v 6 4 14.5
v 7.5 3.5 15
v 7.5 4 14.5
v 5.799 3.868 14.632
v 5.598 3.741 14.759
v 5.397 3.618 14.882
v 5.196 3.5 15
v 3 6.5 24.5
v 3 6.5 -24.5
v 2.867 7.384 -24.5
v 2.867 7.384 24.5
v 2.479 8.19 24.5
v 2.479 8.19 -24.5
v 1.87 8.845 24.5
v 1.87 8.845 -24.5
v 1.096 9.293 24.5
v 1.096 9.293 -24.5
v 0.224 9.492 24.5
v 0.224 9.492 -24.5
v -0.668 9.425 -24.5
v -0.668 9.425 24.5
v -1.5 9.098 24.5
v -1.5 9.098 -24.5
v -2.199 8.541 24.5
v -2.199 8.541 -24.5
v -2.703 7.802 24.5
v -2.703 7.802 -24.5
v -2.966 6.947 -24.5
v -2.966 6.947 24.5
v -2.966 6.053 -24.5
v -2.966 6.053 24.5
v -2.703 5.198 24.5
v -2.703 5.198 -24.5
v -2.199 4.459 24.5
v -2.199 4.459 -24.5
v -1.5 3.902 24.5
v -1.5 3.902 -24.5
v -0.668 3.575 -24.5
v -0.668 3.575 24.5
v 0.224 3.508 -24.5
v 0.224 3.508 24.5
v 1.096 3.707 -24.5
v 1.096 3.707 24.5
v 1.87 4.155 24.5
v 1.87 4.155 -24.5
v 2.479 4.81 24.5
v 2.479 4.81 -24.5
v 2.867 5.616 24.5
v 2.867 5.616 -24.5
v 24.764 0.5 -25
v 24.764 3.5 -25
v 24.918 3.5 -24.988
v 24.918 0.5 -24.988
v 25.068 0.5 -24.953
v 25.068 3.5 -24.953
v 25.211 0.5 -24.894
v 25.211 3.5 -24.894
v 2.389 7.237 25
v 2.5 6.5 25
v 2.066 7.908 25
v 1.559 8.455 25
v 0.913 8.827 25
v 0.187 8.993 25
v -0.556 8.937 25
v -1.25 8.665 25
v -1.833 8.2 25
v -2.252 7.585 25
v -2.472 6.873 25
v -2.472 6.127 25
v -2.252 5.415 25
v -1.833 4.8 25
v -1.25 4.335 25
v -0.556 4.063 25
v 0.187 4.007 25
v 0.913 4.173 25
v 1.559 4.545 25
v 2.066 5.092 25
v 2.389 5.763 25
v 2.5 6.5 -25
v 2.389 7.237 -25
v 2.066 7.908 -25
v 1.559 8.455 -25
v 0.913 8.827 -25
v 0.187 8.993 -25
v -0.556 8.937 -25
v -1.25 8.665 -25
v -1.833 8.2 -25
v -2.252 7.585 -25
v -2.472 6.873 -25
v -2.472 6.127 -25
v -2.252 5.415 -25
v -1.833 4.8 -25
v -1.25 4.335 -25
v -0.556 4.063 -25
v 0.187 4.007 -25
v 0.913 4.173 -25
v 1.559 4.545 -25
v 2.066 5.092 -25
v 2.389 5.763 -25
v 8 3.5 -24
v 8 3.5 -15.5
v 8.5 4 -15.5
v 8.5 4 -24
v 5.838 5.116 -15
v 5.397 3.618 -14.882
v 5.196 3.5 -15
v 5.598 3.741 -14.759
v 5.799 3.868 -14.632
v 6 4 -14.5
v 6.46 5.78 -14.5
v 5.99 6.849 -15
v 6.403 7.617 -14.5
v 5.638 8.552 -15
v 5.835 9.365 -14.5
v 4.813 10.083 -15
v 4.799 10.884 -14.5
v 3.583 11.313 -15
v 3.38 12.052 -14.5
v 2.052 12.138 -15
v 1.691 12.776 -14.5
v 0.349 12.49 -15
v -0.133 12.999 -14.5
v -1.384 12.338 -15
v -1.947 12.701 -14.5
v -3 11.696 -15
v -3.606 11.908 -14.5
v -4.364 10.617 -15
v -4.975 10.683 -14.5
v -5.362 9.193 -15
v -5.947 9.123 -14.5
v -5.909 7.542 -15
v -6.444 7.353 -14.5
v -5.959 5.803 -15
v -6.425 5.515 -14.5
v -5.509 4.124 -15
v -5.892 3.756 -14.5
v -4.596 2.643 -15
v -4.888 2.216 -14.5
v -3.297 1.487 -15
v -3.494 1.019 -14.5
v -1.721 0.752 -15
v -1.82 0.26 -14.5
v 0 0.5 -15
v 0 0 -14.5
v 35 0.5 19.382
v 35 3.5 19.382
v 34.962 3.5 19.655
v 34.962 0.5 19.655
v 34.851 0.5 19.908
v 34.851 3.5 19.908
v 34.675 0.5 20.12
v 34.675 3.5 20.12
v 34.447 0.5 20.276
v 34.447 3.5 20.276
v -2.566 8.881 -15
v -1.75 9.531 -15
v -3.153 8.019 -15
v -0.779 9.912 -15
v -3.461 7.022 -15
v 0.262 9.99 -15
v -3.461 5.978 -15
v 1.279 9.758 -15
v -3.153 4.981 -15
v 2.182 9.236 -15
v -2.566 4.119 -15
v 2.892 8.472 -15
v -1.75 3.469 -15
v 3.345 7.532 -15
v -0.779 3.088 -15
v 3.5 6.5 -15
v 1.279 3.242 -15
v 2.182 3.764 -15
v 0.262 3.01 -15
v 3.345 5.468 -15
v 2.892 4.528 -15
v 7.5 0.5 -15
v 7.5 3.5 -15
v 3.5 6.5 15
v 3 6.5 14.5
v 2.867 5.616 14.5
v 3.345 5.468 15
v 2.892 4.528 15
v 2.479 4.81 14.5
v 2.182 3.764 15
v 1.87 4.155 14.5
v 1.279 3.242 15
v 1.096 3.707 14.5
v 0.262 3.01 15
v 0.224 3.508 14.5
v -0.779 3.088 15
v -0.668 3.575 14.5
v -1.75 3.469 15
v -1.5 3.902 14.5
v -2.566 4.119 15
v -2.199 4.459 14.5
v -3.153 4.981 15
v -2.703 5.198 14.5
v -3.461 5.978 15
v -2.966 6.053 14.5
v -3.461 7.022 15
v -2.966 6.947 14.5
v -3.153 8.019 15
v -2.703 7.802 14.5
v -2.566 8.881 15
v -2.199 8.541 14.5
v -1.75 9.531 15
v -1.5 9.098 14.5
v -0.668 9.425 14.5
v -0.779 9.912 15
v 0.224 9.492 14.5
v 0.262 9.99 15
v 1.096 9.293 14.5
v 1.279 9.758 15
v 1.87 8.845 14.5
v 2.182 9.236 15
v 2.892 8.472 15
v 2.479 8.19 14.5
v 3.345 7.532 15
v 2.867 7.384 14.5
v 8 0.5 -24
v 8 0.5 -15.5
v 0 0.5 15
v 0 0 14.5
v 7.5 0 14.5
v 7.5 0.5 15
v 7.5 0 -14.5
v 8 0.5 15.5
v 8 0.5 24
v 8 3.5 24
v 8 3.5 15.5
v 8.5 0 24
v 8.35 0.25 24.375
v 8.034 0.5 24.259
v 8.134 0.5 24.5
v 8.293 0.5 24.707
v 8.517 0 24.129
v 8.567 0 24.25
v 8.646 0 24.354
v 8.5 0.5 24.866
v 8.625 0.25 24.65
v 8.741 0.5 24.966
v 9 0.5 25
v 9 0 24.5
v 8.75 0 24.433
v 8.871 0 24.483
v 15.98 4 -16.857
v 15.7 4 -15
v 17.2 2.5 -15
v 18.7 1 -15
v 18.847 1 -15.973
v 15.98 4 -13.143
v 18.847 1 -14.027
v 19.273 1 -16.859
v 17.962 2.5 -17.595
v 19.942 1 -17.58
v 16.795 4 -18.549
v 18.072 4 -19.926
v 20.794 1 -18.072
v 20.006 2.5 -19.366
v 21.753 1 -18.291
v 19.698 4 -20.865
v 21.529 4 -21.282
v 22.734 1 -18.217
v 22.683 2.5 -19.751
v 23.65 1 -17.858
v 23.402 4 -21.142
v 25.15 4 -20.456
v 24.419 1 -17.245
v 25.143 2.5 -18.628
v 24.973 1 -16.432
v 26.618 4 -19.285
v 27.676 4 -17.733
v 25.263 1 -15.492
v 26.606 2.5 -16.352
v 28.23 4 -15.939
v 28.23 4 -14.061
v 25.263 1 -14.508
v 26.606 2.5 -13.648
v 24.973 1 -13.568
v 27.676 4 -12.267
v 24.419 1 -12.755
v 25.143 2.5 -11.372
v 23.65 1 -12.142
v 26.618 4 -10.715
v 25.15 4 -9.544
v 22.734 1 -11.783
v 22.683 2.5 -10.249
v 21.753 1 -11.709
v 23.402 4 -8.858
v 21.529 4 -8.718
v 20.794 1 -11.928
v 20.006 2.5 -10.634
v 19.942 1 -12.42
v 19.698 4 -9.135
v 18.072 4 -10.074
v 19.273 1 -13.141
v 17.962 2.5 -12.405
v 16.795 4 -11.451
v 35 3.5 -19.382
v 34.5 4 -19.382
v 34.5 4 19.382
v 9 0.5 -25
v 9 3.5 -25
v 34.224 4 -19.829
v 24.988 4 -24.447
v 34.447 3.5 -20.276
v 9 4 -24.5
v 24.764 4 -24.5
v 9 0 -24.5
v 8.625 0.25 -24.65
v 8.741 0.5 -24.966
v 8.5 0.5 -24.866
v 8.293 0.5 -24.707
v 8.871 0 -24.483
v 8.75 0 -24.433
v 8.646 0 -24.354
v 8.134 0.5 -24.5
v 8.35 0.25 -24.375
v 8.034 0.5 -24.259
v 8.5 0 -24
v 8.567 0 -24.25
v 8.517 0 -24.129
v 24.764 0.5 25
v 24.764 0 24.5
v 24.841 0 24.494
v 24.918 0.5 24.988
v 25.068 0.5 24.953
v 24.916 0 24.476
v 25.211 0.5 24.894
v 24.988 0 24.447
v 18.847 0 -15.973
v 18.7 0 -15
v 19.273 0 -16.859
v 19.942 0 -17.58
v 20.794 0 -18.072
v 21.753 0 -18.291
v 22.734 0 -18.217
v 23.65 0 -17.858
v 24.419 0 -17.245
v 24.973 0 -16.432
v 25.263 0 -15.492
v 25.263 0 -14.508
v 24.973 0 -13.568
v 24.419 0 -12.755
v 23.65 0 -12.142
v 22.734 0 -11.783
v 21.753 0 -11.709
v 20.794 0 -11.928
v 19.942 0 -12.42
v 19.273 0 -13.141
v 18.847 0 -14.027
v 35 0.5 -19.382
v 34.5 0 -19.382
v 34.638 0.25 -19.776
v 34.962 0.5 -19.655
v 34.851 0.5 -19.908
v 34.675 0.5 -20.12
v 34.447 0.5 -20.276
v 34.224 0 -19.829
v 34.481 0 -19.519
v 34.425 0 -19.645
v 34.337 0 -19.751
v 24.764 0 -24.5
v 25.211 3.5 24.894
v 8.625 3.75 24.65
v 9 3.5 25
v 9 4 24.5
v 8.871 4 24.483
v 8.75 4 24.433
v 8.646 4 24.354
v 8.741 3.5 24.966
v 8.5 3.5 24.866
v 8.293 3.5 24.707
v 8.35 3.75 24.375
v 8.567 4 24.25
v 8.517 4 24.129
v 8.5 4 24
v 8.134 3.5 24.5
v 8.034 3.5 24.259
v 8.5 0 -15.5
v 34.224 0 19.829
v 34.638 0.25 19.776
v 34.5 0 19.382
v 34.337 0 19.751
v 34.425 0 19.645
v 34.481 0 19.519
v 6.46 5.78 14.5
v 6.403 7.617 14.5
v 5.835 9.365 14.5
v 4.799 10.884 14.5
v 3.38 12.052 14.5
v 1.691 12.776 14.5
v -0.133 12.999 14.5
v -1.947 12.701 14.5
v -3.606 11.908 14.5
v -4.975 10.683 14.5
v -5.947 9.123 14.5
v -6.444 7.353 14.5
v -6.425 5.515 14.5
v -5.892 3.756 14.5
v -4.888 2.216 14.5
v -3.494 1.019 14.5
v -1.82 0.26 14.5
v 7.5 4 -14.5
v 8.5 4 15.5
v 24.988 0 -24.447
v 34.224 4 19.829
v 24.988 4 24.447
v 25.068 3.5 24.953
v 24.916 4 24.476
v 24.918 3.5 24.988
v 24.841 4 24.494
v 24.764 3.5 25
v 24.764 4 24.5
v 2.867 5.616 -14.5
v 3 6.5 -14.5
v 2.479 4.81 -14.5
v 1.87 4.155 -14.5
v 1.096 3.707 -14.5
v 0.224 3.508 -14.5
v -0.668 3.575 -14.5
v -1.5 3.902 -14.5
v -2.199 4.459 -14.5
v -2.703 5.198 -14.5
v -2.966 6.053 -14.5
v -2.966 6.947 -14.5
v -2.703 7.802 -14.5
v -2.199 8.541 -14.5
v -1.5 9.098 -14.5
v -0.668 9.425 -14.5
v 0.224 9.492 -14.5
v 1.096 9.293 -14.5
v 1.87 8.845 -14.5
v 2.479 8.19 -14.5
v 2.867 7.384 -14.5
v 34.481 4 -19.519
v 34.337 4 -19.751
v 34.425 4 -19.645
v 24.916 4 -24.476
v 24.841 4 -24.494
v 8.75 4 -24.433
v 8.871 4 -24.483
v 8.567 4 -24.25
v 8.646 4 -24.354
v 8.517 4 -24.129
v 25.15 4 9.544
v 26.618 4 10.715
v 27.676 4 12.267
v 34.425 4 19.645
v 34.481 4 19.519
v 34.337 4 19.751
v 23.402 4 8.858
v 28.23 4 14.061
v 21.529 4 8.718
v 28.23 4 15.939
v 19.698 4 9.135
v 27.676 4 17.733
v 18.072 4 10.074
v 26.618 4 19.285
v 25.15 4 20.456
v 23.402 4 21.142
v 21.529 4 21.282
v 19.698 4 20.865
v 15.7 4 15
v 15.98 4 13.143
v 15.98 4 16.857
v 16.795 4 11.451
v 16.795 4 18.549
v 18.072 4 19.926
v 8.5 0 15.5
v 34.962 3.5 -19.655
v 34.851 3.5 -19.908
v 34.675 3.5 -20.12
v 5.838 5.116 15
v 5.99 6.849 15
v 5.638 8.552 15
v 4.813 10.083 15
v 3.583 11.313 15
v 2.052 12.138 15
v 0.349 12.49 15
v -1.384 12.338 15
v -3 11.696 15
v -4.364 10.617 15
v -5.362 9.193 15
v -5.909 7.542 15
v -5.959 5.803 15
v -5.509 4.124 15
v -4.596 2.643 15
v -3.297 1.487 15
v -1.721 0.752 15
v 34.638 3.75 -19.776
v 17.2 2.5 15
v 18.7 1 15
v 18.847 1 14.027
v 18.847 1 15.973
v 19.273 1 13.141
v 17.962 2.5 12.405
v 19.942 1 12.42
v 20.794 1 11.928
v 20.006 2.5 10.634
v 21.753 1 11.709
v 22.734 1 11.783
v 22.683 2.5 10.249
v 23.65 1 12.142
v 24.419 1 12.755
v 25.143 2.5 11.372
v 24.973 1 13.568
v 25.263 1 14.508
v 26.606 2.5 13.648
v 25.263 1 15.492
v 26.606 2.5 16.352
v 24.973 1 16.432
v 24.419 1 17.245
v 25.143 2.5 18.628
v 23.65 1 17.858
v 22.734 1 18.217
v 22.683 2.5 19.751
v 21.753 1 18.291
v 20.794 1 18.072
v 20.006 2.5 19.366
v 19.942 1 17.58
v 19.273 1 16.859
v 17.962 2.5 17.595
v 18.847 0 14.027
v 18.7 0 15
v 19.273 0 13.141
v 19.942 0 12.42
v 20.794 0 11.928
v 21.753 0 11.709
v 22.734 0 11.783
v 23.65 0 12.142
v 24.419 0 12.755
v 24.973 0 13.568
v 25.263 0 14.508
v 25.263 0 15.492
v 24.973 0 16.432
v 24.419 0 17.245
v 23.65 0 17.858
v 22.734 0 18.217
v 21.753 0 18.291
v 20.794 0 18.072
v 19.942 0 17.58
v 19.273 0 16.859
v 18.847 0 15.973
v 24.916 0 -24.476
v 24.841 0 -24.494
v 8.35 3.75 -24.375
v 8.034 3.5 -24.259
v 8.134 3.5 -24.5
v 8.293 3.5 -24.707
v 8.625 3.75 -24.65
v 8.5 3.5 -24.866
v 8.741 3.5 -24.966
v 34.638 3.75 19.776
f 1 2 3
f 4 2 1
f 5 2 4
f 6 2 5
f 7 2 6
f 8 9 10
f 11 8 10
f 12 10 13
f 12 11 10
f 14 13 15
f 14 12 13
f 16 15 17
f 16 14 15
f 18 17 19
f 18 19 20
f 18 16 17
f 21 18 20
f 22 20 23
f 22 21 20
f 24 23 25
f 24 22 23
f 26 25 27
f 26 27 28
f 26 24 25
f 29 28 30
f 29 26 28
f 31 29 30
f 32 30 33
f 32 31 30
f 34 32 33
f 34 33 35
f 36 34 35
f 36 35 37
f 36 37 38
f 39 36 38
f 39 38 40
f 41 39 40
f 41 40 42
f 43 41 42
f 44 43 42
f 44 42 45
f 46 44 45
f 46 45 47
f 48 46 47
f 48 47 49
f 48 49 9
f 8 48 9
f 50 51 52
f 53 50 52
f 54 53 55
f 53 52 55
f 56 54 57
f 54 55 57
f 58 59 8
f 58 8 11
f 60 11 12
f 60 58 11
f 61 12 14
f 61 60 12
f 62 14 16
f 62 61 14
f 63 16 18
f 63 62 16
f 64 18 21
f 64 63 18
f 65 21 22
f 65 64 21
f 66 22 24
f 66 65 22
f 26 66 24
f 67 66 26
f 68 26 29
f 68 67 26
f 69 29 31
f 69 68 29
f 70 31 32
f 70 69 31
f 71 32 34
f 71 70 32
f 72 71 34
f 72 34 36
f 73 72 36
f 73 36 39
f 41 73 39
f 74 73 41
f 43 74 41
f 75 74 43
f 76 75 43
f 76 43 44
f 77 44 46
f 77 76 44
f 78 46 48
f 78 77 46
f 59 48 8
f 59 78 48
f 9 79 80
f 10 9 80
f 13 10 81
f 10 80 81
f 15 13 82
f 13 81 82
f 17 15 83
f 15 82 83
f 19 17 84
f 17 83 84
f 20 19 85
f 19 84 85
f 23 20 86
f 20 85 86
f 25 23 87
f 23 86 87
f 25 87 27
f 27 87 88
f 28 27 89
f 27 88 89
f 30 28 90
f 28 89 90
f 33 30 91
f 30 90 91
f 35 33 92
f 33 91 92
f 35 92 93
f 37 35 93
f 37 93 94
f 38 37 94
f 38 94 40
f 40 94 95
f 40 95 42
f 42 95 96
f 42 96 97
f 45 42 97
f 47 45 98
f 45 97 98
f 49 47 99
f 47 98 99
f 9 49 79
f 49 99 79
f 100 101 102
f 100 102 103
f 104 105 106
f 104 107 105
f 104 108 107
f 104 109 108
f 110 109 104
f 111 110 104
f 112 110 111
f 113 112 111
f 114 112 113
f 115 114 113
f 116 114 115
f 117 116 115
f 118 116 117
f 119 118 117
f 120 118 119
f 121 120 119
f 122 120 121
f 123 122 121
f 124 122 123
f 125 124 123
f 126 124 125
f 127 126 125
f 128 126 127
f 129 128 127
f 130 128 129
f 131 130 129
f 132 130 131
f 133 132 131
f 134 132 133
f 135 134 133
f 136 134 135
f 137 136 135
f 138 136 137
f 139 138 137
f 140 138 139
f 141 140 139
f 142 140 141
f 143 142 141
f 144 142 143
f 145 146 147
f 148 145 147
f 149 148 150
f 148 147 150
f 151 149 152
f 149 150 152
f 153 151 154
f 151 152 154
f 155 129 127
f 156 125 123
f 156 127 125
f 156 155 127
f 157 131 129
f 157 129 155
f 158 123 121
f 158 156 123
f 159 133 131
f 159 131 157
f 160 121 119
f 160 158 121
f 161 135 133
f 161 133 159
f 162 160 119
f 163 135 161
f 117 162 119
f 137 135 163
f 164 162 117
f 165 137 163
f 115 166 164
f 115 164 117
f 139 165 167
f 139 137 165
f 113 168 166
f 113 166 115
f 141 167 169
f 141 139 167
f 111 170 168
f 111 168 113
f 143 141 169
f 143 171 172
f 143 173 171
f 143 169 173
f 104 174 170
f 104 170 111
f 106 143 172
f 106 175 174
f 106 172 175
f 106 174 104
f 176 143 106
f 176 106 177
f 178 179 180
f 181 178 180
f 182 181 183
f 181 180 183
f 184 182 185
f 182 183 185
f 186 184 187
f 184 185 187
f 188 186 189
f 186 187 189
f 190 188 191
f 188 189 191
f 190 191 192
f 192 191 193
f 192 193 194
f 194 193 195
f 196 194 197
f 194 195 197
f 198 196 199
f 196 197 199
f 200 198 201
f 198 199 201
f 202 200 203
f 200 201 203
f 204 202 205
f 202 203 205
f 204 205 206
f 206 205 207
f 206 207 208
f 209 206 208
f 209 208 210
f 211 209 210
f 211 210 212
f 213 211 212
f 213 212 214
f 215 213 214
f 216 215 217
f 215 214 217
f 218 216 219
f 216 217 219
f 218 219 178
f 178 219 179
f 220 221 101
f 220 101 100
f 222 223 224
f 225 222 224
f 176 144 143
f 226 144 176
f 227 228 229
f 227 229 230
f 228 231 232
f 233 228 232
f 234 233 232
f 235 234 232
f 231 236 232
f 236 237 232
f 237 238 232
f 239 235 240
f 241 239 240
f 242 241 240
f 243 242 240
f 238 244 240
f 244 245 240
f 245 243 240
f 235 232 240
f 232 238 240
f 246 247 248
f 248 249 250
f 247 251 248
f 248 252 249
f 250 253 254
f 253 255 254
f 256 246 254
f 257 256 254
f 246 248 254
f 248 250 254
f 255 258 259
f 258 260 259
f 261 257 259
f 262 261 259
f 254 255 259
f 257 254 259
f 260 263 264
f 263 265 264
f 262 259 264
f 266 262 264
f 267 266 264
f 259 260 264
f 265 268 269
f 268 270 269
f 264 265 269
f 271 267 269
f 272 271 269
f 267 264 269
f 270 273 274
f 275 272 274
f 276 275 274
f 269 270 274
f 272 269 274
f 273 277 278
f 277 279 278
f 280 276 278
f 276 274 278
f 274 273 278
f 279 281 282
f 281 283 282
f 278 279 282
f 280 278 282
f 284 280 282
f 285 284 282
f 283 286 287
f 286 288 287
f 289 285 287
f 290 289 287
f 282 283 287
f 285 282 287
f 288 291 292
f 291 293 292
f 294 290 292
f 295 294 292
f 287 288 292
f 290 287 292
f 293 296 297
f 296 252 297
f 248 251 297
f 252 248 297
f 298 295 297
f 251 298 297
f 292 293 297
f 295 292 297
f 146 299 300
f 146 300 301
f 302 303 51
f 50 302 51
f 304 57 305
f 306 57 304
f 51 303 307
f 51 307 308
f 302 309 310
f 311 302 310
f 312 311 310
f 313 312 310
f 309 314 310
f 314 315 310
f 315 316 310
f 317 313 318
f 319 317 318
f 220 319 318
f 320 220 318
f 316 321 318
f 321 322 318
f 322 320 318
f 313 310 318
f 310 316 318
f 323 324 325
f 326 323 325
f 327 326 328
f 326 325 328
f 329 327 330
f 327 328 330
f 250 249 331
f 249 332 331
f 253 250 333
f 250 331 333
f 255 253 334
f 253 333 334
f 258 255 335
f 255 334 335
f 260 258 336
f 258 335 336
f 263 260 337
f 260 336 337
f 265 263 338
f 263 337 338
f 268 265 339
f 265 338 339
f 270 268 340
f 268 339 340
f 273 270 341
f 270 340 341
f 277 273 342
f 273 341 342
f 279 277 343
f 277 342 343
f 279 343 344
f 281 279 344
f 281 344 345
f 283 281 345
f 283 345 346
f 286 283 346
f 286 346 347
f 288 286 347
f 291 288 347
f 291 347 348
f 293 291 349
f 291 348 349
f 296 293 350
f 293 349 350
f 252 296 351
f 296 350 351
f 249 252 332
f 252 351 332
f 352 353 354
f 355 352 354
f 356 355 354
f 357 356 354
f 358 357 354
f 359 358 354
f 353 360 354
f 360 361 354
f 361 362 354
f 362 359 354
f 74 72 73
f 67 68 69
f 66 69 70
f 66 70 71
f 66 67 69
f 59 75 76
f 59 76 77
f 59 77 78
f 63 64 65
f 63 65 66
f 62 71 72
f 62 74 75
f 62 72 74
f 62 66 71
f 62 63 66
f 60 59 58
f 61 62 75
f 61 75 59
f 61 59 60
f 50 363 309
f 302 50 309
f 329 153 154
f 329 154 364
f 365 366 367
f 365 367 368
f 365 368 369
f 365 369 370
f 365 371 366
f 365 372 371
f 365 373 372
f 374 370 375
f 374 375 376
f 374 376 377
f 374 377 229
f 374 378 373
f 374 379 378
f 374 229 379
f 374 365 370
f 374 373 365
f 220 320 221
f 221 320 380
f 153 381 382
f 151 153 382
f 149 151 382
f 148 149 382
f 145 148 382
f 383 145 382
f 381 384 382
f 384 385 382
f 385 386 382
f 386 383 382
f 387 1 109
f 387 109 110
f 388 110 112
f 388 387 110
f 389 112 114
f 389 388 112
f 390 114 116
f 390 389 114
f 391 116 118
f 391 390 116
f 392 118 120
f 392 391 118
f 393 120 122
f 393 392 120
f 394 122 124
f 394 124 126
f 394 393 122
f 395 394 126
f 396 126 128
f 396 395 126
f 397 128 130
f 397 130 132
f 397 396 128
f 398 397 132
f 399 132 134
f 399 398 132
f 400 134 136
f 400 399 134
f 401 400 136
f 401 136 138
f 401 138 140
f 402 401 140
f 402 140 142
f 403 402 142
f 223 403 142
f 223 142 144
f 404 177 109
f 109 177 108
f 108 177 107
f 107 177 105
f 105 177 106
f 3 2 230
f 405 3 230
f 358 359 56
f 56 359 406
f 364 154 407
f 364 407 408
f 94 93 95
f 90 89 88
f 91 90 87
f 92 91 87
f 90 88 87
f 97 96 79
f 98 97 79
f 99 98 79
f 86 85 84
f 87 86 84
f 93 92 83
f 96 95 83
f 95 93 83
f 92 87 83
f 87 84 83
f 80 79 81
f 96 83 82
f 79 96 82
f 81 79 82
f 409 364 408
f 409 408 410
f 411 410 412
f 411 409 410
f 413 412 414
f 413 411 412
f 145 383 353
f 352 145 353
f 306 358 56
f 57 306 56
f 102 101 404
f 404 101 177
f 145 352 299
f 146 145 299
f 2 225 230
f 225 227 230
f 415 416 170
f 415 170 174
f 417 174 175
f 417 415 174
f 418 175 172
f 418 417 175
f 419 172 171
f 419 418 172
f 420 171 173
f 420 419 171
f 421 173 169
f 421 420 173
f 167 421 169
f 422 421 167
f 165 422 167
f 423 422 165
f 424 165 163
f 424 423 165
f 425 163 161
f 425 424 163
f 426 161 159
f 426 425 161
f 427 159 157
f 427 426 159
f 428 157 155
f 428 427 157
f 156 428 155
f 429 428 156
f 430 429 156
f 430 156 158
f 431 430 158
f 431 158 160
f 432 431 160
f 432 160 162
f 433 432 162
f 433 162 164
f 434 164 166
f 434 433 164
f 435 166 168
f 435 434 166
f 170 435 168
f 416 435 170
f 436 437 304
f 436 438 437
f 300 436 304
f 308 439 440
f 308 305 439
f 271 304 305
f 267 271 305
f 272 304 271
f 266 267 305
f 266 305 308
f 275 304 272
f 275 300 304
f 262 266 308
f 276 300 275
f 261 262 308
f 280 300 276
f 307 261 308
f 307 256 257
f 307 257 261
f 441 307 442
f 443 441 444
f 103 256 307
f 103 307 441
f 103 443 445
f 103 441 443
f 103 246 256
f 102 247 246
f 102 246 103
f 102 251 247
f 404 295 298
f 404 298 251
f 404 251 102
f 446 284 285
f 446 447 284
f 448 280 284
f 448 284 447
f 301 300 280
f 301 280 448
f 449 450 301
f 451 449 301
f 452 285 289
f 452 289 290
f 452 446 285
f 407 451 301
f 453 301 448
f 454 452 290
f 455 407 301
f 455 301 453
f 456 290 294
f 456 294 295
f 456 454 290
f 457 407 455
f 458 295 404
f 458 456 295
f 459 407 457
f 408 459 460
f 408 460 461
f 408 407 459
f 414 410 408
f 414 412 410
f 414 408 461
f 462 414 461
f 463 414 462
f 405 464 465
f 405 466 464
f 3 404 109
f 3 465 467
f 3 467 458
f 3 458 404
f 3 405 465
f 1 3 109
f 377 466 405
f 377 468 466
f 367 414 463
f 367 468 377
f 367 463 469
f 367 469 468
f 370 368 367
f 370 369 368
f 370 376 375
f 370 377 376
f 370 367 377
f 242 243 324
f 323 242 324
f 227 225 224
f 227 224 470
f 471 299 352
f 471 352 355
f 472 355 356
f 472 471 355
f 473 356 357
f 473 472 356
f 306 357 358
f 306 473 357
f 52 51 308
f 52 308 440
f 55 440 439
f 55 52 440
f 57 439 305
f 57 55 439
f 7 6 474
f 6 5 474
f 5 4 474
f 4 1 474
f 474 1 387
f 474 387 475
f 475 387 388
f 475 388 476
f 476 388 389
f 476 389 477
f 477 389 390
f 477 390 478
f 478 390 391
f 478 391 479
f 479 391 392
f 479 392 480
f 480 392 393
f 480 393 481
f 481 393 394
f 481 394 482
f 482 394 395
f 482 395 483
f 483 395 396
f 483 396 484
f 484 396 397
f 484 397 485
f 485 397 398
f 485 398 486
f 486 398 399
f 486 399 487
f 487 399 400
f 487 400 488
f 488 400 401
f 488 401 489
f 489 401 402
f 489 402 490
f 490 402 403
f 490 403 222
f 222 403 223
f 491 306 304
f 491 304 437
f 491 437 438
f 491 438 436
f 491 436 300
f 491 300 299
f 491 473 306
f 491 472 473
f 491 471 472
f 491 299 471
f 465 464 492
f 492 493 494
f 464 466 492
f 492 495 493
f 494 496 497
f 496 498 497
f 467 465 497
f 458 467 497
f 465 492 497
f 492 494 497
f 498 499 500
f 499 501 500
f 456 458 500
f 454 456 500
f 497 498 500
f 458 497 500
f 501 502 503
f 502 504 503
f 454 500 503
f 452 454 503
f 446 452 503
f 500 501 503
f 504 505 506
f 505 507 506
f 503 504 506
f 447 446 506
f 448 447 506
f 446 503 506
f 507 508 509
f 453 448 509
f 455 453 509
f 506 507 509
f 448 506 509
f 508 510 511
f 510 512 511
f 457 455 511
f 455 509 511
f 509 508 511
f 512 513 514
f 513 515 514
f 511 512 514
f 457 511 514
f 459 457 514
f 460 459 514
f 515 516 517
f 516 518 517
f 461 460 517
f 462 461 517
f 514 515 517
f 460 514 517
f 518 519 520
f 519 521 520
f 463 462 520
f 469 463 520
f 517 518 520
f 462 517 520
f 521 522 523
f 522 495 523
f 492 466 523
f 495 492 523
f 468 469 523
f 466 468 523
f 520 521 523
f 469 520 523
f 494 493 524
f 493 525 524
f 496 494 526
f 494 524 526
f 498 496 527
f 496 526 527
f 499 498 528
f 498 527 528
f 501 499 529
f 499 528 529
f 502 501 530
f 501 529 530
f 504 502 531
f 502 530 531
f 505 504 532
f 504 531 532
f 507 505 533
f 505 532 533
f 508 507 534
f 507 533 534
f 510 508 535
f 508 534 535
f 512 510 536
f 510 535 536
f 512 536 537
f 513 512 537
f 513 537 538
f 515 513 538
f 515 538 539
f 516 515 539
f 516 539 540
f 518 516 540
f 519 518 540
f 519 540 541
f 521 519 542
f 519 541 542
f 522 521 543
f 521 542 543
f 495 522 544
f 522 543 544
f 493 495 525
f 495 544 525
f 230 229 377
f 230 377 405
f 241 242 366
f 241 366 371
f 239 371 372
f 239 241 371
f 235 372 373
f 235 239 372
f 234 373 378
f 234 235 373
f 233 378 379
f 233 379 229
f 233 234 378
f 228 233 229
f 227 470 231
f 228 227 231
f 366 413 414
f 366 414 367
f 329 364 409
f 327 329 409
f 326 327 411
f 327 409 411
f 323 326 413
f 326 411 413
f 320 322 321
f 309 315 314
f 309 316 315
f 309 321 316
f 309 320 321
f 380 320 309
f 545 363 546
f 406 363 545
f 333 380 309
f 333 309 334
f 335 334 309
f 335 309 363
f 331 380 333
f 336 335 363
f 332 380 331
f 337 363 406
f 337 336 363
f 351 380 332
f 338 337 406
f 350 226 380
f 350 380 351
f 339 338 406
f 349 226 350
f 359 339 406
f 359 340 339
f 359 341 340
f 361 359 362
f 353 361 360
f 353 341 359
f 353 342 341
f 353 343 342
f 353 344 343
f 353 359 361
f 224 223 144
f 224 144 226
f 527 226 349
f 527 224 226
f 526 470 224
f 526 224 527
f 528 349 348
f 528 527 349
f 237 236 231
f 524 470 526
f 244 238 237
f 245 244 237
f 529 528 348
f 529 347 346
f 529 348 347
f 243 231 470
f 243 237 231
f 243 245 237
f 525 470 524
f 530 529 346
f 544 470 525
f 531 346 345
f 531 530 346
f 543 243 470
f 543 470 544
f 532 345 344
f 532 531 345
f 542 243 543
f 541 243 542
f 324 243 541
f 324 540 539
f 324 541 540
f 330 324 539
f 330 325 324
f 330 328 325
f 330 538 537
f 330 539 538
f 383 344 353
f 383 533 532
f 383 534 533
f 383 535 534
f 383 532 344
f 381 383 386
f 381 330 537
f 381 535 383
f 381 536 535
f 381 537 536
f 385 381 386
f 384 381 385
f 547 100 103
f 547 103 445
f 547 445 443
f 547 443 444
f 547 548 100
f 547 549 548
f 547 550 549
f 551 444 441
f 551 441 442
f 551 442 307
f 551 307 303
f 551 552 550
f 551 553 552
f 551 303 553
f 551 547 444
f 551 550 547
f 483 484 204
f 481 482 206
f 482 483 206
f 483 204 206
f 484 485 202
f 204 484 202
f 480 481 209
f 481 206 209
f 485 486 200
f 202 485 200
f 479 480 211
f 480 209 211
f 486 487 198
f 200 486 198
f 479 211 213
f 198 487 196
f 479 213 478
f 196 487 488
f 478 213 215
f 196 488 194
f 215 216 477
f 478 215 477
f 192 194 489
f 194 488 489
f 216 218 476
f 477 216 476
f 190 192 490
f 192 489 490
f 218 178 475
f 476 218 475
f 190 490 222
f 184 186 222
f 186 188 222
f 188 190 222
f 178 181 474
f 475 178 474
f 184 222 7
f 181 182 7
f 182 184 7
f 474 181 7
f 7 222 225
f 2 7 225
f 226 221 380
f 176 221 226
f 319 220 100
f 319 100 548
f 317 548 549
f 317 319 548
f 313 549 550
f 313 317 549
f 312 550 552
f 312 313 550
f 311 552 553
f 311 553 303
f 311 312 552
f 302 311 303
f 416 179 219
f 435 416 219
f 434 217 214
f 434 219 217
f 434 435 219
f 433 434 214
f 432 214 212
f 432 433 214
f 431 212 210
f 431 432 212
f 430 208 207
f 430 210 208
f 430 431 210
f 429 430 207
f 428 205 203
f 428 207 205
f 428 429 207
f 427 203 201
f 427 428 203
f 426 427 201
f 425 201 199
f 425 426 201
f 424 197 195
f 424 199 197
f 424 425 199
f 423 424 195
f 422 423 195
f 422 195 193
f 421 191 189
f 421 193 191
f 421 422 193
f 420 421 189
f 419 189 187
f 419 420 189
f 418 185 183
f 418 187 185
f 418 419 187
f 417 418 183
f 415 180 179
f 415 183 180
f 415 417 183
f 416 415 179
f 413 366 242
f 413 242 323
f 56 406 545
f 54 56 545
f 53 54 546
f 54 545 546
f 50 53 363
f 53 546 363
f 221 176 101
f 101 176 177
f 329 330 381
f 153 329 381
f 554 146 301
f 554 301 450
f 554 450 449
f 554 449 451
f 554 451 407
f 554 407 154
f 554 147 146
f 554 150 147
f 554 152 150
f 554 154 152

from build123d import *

# Parameters (mm, degrees)
SKETCH2_R                                       = 3
BOSS_EXTRUDE1_DEPTH                             = 25
SKETCH3_W                                       = 30
SKETCH3_H                                       = 25
CUT_EXTRUDE1_DEPTH                              = 45.933283877
CSK_FOR_M6_FLAT_HEAD_MACHINE_SCREW1_D           = 6.6
CSK_FOR_M6_FLAT_HEAD_MACHINE_SCREW1_DEPTH       = 38.017159957
CSK_FOR_M6_FLAT_HEAD_MACHINE_SCREW1_CSINK_D     = 12.6
CSK_FOR_M6_FLAT_HEAD_MACHINE_SCREW1_CSINK_ANGLE = 90
CSK_FOR_M6_FLAT_HEAD_MACHINE_SCREW1_TIP         = 1.982840043
FILLET1_R                                       = 1
CHAMFER1_SIZE                                   = 0.5
SKETCH6_R                                       = 3
BOSS_EXTRUDE2_DEPTH                             = 25
CHAMFER2_SIZE                                   = 0.5


with BuildPart() as part:
    # Sketch2 → Boss-Extrude1 (new, symmetric)
    with BuildSketch(Plane.XY):
        with BuildLine():
            Line((35, 4), (6, 4))
            ThreePointArc((6, 4), (-3.605551275, 11.908326913), (0, 0))
            Line((0, 0), (35, 0))
            Line((35, 0), (35, 4))
        make_face()
        with Locations((0, 6.5)):
            Circle(SKETCH2_R, mode=Mode.SUBTRACT)
    extrude(amount=BOSS_EXTRUDE1_DEPTH, both=True)

    # Sketch3 → Cut-Extrude1 (cut, through all)
    with BuildSketch(Plane(origin=(0, 0, 0), x_dir=(1, 0, 0), z_dir=(0, 1, 0))):
        with Locations((-7, 27.5)):
            Rectangle(SKETCH3_W, SKETCH3_H)
        with Locations((-7, -27.5)):
            Rectangle(SKETCH3_W, SKETCH3_H)
        Polygon((35, 20), (25, 25), (35, 25), align=None)
        Polygon((35, -25), (35, -20), (25, -25), align=None)
    extrude(amount=CUT_EXTRUDE1_DEPTH, mode=Mode.SUBTRACT)

    # CSK for M6 Flat Head Machine Screw1
    with Locations(Plane(origin=(0, 4, 0), x_dir=(1, 0, 0), z_dir=(0, 1, 0))):
        with Locations((22, 15), (22, -15)):
            CounterSinkHole(CSK_FOR_M6_FLAT_HEAD_MACHINE_SCREW1_D / 2, CSK_FOR_M6_FLAT_HEAD_MACHINE_SCREW1_CSINK_D / 2, depth=CSK_FOR_M6_FLAT_HEAD_MACHINE_SCREW1_DEPTH, counter_sink_angle=CSK_FOR_M6_FLAT_HEAD_MACHINE_SCREW1_CSINK_ANGLE)
            with Locations((0, 0, -(CSK_FOR_M6_FLAT_HEAD_MACHINE_SCREW1_DEPTH + CSK_FOR_M6_FLAT_HEAD_MACHINE_SCREW1_TIP / 2))):  # 118° drill point
                Cone(0, CSK_FOR_M6_FLAT_HEAD_MACHINE_SCREW1_D / 2, CSK_FOR_M6_FLAT_HEAD_MACHINE_SCREW1_TIP, mode=Mode.SUBTRACT)

    # Fillet1
    fillet1_edges = [part.edges().sort_by_distance(p)[0] for p in [
        (8, 2, -25),
        (25, 2, -25),
        (25, 2, 25),
        (8, 2, 25),
        (35, 2, -20),
        (35, 2, 20),
    ]]
    fillet(fillet1_edges, radius=FILLET1_R)

    # Chamfer1
    chamfer1_edges = [part.edges().sort_by_distance(p)[0] for p in [
        (29.829179607, 4, -22.585410197),
        (29.829179607, 0, -22.585410197),
        (8, 4, 19.5),
        (16.881966011, 4, 25),
        (29.829179607, 4, 22.585410197),
        (35, 4, 0),
        (16.881966011, 4, -25),
        (8.292893219, 4, -24.707106781),
        (8.292893219, 4, 24.707106781),
        (24.993684943, 4, 24.973248989),
        (34.850650808, 4, 19.907697123),
        (34.850650808, 4, -19.907697123),
        (24.993684943, 4, -24.973248989),
        (16.881966011, 0, -25),
        (8, 0, 19.5),
        (35, 0, 0),
        (29.829179607, 0, 22.585410197),
        (16.881966011, 0, 25),
        (8.292893219, 0, -24.707106781),
        (8.292893219, 0, 24.707106781),
        (24.993684943, 0, 24.973248989),
        (34.850650808, 0, 19.907697123),
        (34.850650808, 0, -19.907697123),
        (24.993684943, 0, -24.973248989),
        (-3, 6.5, 15),
        (8, 2, 15),
        (4, 0, 15),
        (7, 4, 15),
        (-3.605551275, 11.908326913, 15),
        (-3, 6.5, -15),
        (4, 0, -15),
        (-3.605551275, 11.908326913, -15),
        (7, 4, -15),
        (8, 2, -15),
        (8, 0, -19.5),
        (8, 4, -19.5),
    ]]
    chamfer(chamfer1_edges, length=CHAMFER1_SIZE)


with BuildPart() as body_2:
    # Sketch6 → Boss-Extrude2 (new, symmetric)
    with BuildSketch(Plane.XY):
        with Locations((0, 6.5)):
            Circle(SKETCH6_R)
    extrude(amount=BOSS_EXTRUDE2_DEPTH, both=True)

    # Chamfer2
    chamfer2_edges = [body_2.edges().sort_by_distance(p)[0] for p in [
        (-3, 6.5, -25),
        (-3, 6.5, 25),
    ]]
    chamfer(chamfer2_edges, length=CHAMFER2_SIZE)


solid = Compound([part.part, body_2.part])
